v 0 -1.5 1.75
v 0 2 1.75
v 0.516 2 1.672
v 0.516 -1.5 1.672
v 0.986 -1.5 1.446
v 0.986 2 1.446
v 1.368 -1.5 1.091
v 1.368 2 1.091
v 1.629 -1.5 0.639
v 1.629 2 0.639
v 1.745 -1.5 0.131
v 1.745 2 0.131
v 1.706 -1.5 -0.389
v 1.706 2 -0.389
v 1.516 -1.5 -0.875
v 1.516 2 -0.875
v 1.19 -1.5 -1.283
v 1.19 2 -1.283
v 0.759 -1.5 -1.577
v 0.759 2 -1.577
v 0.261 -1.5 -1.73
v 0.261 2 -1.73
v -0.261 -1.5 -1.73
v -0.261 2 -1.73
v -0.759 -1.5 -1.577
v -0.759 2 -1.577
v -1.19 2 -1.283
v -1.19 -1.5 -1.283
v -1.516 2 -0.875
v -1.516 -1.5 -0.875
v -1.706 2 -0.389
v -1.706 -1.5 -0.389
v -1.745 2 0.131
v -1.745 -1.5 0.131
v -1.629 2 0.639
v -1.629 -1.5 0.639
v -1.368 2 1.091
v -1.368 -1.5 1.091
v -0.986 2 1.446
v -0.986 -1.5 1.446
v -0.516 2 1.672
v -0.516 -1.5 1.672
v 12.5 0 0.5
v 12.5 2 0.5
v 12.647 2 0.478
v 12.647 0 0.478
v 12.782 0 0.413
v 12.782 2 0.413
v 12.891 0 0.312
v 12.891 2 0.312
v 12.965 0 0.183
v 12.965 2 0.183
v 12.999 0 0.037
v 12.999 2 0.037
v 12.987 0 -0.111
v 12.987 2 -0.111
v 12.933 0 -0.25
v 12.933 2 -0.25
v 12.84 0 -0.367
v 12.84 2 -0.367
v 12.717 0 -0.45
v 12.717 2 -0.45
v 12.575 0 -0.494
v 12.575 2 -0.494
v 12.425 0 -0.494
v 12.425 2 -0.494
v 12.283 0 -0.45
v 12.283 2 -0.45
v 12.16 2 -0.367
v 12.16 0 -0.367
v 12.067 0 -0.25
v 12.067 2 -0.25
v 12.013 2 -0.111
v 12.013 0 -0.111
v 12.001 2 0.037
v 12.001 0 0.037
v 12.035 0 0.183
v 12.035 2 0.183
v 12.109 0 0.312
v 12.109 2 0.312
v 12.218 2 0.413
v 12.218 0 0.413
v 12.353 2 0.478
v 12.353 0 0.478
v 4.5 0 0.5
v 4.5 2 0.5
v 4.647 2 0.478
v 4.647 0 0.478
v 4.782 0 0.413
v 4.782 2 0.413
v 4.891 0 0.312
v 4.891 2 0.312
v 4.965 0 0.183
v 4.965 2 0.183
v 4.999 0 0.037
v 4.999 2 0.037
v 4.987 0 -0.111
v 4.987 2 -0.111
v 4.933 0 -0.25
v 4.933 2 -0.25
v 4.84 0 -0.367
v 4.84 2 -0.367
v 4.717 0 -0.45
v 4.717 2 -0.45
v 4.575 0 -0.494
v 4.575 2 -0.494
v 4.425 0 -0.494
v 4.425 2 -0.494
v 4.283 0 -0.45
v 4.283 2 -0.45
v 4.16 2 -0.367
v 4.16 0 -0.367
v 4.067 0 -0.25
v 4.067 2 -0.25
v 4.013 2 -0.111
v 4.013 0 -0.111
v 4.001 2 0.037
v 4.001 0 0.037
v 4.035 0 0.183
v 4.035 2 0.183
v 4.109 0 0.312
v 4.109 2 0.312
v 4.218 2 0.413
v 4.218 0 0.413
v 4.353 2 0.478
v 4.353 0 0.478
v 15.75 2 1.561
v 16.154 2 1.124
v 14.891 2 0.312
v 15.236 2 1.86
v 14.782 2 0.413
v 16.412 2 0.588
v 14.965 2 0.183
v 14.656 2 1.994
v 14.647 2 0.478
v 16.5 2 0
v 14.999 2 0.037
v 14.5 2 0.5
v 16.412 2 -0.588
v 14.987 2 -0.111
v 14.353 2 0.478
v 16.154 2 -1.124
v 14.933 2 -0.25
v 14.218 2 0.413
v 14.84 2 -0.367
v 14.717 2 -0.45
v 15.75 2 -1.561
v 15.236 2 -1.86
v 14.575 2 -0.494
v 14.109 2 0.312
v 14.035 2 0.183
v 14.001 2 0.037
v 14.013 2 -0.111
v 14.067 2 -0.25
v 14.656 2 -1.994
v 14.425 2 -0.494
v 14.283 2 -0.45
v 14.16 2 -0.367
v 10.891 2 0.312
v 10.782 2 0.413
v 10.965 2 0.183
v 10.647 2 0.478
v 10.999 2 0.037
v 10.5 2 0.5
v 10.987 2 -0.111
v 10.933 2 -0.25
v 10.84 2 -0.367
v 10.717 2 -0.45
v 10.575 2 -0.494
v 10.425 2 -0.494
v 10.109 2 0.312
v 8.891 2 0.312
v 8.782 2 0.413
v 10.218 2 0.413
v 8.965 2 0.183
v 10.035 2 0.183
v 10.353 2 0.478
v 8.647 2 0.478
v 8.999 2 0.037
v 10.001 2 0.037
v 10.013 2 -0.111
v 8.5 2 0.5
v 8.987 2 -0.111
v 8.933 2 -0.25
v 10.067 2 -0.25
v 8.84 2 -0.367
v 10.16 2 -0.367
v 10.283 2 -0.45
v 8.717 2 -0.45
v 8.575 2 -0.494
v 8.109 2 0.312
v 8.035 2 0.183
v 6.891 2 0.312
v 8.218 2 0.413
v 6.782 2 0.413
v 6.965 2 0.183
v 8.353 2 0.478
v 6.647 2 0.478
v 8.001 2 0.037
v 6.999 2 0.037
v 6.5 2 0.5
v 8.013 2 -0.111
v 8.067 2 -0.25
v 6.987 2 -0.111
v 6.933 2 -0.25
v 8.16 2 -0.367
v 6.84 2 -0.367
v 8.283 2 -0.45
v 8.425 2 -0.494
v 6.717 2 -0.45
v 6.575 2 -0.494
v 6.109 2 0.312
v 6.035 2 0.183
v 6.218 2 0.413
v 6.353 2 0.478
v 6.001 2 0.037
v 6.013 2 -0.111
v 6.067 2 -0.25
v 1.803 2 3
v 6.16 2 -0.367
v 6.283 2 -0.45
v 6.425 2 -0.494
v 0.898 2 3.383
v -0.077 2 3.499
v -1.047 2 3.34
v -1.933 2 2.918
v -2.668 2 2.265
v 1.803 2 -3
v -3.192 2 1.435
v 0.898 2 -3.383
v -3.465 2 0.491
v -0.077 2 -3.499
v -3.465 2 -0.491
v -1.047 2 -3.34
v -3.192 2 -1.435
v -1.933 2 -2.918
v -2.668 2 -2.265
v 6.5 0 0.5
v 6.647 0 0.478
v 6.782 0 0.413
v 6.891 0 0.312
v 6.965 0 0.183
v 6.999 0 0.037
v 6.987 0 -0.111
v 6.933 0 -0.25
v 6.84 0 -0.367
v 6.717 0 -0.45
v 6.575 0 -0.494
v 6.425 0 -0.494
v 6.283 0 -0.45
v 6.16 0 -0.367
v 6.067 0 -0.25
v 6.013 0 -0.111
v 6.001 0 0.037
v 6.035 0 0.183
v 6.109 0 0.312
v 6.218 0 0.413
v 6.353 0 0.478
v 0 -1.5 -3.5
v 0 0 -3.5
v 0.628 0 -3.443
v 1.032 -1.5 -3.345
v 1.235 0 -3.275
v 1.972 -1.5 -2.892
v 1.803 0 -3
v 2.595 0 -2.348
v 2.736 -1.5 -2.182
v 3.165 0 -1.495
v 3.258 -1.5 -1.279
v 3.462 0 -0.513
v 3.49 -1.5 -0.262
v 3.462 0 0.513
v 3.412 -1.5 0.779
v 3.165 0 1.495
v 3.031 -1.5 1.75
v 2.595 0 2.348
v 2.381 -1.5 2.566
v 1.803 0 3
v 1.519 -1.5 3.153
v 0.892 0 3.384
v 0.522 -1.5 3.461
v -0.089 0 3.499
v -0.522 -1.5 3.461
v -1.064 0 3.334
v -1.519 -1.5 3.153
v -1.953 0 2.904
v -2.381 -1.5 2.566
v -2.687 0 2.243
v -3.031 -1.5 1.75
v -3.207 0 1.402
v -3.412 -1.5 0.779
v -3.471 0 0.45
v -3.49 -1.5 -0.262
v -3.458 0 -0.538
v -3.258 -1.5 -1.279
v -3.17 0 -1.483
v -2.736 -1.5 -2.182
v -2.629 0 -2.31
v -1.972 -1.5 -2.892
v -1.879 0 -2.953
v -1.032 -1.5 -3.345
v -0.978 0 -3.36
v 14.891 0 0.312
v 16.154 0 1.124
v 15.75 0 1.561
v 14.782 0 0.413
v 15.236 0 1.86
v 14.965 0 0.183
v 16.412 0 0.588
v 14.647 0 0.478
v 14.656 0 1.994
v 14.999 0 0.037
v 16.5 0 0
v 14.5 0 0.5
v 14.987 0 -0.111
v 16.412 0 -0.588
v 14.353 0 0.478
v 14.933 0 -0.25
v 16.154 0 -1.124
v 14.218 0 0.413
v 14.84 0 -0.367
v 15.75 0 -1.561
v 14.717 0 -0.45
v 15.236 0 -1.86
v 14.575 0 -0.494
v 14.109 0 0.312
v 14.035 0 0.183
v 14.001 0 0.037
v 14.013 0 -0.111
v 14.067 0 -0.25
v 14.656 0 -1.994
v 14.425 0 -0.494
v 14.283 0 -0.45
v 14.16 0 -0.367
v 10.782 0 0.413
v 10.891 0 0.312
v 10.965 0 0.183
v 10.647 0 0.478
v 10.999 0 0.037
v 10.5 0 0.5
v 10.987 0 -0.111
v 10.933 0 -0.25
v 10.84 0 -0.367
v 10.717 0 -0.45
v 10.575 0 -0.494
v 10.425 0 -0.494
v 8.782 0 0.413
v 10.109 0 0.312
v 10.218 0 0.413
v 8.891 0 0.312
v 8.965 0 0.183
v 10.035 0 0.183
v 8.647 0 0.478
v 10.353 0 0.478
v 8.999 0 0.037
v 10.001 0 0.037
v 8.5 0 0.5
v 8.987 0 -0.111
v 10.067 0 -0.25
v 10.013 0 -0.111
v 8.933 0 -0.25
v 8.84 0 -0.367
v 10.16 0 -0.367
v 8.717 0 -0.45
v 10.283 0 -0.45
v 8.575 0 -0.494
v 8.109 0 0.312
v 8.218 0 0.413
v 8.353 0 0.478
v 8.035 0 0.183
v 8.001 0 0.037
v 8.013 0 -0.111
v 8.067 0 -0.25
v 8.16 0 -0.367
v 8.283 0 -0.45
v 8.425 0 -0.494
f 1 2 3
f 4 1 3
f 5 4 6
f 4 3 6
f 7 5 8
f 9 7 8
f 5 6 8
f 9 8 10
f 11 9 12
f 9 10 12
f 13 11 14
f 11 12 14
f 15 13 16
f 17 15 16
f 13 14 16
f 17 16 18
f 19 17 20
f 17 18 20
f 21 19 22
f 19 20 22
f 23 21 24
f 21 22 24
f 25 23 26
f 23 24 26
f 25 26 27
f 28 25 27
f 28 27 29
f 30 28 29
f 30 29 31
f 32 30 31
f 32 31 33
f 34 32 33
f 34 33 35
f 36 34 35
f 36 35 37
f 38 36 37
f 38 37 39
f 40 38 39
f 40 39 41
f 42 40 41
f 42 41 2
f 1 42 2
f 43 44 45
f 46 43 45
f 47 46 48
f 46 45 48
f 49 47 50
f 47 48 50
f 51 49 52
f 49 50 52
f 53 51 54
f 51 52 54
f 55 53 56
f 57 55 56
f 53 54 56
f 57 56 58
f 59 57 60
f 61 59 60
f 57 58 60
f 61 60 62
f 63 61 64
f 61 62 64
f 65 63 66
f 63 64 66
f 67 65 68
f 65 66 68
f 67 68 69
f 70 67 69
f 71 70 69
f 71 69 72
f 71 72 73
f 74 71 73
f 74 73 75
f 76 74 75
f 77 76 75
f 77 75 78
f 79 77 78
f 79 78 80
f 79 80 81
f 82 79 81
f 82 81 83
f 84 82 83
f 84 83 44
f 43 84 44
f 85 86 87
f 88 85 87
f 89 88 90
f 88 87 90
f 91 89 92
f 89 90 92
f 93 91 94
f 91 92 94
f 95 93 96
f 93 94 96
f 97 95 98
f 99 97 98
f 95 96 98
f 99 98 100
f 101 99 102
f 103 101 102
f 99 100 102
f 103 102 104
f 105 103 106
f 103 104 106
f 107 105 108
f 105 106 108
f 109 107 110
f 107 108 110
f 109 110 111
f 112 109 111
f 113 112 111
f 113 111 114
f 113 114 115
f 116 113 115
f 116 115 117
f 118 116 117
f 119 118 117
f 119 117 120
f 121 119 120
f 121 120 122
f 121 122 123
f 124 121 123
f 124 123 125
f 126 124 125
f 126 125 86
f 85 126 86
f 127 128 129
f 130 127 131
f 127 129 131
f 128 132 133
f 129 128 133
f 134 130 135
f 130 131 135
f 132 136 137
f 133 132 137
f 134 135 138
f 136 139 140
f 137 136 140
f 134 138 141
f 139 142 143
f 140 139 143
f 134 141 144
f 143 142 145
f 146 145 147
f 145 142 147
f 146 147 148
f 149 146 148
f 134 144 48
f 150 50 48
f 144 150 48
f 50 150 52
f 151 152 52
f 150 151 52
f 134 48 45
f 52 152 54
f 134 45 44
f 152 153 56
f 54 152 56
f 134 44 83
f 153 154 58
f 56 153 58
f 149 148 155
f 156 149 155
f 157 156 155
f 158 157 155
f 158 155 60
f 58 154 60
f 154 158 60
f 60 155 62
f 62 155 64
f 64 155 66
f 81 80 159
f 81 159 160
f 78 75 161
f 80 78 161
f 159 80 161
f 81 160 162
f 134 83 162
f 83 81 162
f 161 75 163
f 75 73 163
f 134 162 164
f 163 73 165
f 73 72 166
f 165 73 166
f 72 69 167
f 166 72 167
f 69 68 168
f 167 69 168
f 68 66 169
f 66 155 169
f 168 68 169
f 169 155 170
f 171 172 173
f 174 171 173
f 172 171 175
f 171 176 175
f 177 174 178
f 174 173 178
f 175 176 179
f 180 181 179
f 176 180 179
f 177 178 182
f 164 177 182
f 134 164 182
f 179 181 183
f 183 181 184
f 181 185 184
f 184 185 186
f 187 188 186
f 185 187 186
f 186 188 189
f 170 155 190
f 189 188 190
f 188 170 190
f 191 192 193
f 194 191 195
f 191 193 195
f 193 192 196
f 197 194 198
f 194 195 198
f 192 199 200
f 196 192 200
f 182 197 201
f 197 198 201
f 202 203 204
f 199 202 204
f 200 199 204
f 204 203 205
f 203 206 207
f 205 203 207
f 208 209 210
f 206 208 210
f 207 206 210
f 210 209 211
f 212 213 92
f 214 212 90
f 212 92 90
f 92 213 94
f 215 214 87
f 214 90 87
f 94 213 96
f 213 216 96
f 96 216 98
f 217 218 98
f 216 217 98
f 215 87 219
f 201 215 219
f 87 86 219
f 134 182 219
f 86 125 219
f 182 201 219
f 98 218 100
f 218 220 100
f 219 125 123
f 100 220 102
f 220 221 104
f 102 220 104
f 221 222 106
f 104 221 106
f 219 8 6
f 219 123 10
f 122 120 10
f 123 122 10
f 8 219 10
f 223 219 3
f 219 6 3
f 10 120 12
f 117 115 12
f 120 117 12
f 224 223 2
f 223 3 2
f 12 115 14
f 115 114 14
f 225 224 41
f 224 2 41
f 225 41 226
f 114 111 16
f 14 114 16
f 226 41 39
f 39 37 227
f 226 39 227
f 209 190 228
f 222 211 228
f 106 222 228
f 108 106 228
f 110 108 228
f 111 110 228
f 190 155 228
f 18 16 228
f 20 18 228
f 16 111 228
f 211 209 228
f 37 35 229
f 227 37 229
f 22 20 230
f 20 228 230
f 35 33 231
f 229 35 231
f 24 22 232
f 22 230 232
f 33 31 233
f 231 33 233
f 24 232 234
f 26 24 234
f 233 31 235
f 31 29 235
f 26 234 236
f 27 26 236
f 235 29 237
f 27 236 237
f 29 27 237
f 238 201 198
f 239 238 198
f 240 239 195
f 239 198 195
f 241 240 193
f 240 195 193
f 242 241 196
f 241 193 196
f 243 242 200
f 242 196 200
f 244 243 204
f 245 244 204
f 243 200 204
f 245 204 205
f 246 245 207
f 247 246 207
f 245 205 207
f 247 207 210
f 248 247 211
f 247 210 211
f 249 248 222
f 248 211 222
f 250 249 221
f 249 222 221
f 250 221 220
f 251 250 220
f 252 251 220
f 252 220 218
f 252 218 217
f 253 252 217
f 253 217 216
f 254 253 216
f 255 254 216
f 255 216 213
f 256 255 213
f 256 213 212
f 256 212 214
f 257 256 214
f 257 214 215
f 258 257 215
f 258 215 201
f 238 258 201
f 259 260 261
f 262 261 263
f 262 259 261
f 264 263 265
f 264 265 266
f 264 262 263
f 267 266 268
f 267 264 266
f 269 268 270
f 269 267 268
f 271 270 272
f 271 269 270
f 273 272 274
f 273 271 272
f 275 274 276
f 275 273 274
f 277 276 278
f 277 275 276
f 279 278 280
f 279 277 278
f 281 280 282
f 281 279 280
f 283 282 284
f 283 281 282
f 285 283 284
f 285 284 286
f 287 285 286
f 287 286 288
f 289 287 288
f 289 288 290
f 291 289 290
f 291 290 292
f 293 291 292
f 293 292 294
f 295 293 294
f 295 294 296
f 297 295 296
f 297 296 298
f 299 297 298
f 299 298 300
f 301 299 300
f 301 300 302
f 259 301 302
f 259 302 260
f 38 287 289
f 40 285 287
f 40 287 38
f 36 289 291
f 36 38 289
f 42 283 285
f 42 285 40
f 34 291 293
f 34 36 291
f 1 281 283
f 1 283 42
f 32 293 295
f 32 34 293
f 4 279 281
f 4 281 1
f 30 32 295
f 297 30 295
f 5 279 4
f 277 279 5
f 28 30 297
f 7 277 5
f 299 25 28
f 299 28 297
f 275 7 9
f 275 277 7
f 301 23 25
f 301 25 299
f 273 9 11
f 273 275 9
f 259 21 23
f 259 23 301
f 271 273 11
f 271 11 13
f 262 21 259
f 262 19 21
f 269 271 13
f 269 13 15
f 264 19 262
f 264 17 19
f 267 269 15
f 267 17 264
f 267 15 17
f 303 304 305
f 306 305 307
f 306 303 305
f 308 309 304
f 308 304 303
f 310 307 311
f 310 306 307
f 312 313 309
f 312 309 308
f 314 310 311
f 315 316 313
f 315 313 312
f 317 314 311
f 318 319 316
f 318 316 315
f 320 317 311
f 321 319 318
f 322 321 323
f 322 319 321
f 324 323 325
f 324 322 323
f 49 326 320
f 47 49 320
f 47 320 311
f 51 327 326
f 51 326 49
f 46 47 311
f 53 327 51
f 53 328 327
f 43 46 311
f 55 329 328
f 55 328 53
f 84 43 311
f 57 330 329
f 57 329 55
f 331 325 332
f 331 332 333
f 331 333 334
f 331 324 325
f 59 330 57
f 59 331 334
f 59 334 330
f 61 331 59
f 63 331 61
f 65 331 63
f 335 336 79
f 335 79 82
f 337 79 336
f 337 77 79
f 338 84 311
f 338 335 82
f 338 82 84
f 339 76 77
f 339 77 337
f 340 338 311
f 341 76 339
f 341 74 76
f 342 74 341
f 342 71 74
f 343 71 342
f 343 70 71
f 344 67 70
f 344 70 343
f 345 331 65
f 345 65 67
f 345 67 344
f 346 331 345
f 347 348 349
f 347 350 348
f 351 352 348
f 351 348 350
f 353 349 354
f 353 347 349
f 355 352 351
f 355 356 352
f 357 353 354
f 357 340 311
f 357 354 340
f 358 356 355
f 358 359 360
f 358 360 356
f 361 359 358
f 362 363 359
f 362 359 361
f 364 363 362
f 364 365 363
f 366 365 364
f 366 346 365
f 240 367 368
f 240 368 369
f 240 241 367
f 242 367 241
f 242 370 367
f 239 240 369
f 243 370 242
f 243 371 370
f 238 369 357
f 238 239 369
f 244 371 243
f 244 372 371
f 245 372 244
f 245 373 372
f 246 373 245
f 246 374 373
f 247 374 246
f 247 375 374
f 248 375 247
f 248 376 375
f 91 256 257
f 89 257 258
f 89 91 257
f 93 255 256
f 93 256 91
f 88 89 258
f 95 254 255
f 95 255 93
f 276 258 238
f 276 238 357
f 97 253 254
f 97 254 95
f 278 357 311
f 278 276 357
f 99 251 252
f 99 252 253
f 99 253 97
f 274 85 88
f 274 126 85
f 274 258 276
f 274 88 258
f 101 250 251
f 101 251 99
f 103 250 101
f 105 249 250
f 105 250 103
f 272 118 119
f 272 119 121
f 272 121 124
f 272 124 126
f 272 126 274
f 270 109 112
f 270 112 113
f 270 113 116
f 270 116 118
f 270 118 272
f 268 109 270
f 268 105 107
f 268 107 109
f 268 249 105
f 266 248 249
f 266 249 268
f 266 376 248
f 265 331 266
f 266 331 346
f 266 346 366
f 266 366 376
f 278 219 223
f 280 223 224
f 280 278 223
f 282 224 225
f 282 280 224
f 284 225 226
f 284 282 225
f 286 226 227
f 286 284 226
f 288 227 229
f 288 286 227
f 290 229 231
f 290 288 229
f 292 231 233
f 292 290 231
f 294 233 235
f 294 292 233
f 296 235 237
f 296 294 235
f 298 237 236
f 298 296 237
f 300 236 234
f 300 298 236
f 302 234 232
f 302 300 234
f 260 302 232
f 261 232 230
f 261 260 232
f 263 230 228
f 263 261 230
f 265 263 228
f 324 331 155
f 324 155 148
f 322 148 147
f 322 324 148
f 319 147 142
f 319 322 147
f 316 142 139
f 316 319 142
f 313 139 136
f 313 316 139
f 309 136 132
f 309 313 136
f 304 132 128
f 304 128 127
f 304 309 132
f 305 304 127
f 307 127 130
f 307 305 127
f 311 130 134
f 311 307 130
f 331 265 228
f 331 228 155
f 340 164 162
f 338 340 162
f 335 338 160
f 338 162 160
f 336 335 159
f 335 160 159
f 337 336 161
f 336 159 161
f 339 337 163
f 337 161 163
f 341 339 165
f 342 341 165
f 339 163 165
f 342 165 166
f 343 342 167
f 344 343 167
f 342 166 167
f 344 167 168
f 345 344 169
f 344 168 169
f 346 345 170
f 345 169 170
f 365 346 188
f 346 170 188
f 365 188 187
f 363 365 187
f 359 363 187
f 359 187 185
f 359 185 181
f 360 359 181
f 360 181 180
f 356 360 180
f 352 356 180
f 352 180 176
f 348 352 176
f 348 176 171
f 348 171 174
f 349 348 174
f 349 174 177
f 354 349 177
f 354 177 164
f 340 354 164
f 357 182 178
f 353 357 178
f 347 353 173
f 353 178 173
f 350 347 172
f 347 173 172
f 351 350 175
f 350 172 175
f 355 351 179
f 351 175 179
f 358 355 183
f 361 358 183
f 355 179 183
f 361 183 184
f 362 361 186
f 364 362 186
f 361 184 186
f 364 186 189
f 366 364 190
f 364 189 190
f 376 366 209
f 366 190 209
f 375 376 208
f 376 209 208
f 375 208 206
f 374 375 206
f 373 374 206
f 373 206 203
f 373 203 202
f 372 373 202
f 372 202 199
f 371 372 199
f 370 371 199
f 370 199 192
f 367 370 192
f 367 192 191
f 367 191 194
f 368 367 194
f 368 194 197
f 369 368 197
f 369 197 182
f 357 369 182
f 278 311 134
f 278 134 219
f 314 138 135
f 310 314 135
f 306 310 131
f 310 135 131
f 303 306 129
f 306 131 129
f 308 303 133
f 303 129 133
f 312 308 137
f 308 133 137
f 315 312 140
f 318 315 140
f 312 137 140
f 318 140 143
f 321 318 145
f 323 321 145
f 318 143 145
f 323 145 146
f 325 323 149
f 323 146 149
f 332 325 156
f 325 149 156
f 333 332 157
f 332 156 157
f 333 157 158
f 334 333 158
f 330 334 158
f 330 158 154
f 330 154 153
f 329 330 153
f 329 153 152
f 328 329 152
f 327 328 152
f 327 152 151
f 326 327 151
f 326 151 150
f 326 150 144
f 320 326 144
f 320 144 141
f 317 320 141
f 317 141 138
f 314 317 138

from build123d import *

# Parameters (mm, degrees)
BOSS_EXTRUDE1_DEPTH = 2
BOSS_EXTRUDE2_START = 1.5
SKETCH2_R           = 3.5
BOSS_EXTRUDE2_DEPTH = 1.5
SKETCH3_R           = 1.75
CUT_EXTRUDE1_DEPTH  = 5
SKETCH4_R           = 0.5
CUT_EXTRUDE2_DEPTH  = 5


with BuildPart() as part:
    # Sketch1 → Boss-Extrude1 (new body)
    with BuildSketch(Plane(origin=(0, 0, 0), x_dir=(1, 0, 0), z_dir=(0, 1, 0))):
        with BuildLine():
            Line((1.802775638, 3), (14.656073705, 1.99390095))
            ThreePointArc((14.656073705, 1.99390095), (16.5, 0), (14.656073705, -1.99390095))
            Line((14.656073705, -1.99390095), (1.802775638, -3))
            ThreePointArc((1.802775638, -3), (-3.5, 0), (1.802775638, 3))
        make_face()
    extrude(amount=BOSS_EXTRUDE1_DEPTH)

    # Sketch2 → Boss-Extrude2 (add)
    with BuildSketch(Plane.XZ.offset(BOSS_EXTRUDE2_START)):
        with Locations(Location((0, 0, 0), (0, 0, 270))):
            Circle(SKETCH2_R)
    extrude(amount=-BOSS_EXTRUDE2_DEPTH)

    # Sketch3 → Cut-Extrude1 (cut)
    with BuildSketch(Plane(origin=(0, 2, 0), x_dir=(1, 0, 0), z_dir=(0, 1, 0))):
        with Locations(Location((0, 0, 0), (0, 0, 270))):
            Circle(SKETCH3_R)
    extrude(amount=-CUT_EXTRUDE1_DEPTH, mode=Mode.SUBTRACT)

    # Sketch4 → Cut-Extrude2 (cut)
    with BuildSketch(Plane(origin=(0, 2, 0), x_dir=(1, 0, 0), z_dir=(0, 1, 0))):
        with Locations(Location((4.5, 0, 0), (0, 0, 270))):
            Circle(SKETCH4_R)
        with Locations(Location((6.5, 0, 0), (0, 0, 270))):
            Circle(SKETCH4_R)
        with Locations(Location((8.5, 0, 0), (0, 0, 270))):
            Circle(SKETCH4_R)
        with Locations(Location((10.5, 0, 0), (0, 0, 270))):
            Circle(SKETCH4_R)
        with Locations(Location((12.5, 0, 0), (0, 0, 270))):
            Circle(SKETCH4_R)
        with Locations(Location((14.5, 0, 0), (0, 0, 270))):
            Circle(SKETCH4_R)
    extrude(amount=-CUT_EXTRUDE2_DEPTH, mode=Mode.SUBTRACT)


solid = part.part
